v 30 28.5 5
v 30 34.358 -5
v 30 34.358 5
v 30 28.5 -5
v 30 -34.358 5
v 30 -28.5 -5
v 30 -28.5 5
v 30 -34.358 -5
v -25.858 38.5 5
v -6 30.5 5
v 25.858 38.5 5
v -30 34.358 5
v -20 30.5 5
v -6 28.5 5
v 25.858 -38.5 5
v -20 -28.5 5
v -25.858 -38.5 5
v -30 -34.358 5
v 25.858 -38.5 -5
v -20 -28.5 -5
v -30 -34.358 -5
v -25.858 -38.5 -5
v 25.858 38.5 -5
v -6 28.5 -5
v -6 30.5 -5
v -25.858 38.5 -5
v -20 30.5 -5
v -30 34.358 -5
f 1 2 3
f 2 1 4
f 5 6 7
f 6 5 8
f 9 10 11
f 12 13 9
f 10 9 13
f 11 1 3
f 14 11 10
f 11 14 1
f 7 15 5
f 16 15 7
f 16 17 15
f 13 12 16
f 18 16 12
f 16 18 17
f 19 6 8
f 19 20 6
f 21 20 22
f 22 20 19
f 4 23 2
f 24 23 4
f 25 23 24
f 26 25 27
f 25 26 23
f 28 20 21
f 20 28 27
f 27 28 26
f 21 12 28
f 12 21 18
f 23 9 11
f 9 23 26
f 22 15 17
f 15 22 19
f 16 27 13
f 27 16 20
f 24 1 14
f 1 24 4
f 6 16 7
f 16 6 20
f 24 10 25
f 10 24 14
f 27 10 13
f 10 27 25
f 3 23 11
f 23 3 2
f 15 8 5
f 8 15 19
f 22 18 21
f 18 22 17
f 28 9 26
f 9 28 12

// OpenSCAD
/* * * * * * * * * * * * * * * * * * * * * * * * * * * * * * * * * * * * *\
 * Copyright (C) Claus Schrammel <claus@f05fk.net>                       *
 *                                                                       *
 * This program is free software: you can redistribute it and/or modify  *
 * it under the terms of the GNU General Public License as published by  *
 * the Free Software Foundation, either version 3 of the License, or     *
 * (at your option) any later version.                                   *
 *                                                                       *
 * This program is distributed in the hope that it will be useful,       *
 * but WITHOUT ANY WARRANTY; without even the implied warranty of        *
 * MERCHANTABILITY or FITNESS FOR A PARTICULAR PURPOSE.  See the         *
 * GNU General Public License for more details.                          *
 *                                                                       *
 * You should have received a copy of the GNU General Public License     *
 * along with this program.  If not, see <http://www.gnu.org/licenses/>. *
 *                                                                       *
 * SPDX-License-Identifier: GPL-3.0-or-later                             *
\* * * * * * * * * * * * * * * * * * * * * * * * * * * * * * * * * * * * */
$fn = 120;

difference() {
    cube([60, 77, 10], center = true);

    translate([10, 0, 0]) cube([60, 57, 12], center = true);
    translate([-13, 20.5, 0]) cube([14, 20, 12], center = true);

    translate([ 35,  43.5, 0]) rotate(45) cube([20, 20, 20], center = true);
    translate([ 35, -43.5, 0]) rotate(45) cube([20, 20, 20], center = true);
    translate([-35, -43.5, 0]) rotate(45) cube([20, 20, 20], center = true);
    translate([-35,  43.5, 0]) rotate(45) cube([20, 20, 20], center = true);
}
